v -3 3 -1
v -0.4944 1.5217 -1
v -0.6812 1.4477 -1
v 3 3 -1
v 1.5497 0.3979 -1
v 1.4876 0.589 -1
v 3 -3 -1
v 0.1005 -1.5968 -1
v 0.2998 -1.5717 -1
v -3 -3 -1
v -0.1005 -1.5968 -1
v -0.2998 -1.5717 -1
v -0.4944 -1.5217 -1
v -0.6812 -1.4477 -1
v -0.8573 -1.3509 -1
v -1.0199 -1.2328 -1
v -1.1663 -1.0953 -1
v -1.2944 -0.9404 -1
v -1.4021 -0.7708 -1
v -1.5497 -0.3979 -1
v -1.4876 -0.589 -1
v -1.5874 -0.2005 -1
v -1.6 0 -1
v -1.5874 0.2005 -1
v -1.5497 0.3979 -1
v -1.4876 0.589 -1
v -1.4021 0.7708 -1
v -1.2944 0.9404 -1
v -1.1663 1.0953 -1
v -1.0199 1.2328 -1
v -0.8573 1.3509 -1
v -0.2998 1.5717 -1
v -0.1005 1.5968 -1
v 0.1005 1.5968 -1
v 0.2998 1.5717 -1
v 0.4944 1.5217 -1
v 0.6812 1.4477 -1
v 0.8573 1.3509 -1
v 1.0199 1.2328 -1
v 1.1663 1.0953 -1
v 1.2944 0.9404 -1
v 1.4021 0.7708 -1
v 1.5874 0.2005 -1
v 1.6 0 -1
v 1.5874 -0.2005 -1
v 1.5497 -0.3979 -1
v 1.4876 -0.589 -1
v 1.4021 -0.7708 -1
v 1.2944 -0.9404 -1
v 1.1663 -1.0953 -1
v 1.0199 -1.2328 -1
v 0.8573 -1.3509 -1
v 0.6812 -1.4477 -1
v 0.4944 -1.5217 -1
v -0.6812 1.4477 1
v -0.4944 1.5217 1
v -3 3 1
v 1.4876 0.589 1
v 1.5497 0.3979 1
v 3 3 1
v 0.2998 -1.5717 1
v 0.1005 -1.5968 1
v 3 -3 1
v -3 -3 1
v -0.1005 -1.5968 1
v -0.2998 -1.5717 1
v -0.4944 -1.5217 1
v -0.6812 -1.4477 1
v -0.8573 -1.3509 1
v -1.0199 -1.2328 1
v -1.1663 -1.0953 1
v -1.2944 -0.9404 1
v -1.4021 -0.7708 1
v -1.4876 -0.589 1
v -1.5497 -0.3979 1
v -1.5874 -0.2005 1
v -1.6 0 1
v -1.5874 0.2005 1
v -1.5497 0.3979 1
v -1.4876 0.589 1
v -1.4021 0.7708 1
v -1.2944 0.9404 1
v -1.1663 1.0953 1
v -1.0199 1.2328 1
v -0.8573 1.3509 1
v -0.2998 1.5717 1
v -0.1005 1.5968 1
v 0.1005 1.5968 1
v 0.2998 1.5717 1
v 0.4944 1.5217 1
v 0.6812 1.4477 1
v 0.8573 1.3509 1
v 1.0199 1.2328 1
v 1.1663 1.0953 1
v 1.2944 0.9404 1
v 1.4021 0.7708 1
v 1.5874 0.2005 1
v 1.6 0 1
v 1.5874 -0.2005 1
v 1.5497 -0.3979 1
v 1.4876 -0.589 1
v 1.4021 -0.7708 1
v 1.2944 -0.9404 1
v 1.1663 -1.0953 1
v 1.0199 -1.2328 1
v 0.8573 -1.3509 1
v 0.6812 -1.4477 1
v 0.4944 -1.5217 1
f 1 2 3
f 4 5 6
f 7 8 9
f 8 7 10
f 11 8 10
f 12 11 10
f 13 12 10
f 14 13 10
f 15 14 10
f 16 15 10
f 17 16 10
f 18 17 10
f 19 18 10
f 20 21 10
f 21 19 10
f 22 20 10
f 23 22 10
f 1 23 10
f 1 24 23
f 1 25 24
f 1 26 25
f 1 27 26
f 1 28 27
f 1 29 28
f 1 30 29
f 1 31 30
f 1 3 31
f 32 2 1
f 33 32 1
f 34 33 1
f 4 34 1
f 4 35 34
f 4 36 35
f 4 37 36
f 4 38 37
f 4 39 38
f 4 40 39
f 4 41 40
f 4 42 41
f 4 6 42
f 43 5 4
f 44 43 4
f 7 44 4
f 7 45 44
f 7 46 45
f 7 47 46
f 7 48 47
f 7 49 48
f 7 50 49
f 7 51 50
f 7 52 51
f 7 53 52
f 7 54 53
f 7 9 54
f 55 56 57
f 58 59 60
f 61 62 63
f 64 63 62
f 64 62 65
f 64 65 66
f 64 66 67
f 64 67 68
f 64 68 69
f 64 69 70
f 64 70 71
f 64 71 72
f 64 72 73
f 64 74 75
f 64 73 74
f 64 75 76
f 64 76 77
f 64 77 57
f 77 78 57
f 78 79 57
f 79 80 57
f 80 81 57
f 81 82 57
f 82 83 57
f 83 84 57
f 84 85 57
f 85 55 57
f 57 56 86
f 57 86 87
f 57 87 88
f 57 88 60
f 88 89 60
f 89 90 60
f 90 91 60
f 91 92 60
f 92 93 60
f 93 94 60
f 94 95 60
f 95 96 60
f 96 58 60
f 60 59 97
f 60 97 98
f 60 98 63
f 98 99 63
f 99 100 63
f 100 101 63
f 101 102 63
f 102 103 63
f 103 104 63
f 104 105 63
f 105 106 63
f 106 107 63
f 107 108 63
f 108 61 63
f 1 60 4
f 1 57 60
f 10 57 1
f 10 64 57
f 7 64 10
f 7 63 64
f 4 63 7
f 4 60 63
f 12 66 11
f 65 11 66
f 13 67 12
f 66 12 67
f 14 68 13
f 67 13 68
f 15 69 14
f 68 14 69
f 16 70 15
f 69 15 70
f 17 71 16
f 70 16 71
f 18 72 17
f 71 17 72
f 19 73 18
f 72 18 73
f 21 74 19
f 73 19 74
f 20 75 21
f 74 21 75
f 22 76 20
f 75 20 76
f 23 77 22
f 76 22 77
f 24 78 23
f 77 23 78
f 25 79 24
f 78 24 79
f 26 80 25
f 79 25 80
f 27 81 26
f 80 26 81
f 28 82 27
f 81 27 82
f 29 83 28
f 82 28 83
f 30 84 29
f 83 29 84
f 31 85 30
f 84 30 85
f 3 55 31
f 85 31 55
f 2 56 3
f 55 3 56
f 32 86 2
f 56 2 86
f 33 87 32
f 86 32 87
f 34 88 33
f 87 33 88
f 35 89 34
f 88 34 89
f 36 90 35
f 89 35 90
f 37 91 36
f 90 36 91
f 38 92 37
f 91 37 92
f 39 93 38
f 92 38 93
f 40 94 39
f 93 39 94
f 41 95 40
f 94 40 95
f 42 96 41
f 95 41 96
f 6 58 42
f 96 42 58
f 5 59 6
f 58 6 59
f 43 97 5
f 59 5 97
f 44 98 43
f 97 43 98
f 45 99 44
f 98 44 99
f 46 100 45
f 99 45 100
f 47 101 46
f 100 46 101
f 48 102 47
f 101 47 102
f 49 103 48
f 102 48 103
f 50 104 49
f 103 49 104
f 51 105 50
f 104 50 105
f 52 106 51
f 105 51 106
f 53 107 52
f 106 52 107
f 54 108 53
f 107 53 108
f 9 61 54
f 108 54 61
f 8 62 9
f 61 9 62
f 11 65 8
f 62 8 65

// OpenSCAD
// file: box_mount.2d.scad
module box_mount() {
  difference() {
    polygon(points=[
          [-3,-3],
          [3,-3],
          [3,3],
          [-3,3],
        ],convexity=10);
    circle(d=3.2, $fn=50);
  }
}

box_mount();
// main file
use <box_mount.2d.scad>;

linear_extrude(height = 2, center = true, convexity = 10, twist = 0) {
  box_mount();
}
